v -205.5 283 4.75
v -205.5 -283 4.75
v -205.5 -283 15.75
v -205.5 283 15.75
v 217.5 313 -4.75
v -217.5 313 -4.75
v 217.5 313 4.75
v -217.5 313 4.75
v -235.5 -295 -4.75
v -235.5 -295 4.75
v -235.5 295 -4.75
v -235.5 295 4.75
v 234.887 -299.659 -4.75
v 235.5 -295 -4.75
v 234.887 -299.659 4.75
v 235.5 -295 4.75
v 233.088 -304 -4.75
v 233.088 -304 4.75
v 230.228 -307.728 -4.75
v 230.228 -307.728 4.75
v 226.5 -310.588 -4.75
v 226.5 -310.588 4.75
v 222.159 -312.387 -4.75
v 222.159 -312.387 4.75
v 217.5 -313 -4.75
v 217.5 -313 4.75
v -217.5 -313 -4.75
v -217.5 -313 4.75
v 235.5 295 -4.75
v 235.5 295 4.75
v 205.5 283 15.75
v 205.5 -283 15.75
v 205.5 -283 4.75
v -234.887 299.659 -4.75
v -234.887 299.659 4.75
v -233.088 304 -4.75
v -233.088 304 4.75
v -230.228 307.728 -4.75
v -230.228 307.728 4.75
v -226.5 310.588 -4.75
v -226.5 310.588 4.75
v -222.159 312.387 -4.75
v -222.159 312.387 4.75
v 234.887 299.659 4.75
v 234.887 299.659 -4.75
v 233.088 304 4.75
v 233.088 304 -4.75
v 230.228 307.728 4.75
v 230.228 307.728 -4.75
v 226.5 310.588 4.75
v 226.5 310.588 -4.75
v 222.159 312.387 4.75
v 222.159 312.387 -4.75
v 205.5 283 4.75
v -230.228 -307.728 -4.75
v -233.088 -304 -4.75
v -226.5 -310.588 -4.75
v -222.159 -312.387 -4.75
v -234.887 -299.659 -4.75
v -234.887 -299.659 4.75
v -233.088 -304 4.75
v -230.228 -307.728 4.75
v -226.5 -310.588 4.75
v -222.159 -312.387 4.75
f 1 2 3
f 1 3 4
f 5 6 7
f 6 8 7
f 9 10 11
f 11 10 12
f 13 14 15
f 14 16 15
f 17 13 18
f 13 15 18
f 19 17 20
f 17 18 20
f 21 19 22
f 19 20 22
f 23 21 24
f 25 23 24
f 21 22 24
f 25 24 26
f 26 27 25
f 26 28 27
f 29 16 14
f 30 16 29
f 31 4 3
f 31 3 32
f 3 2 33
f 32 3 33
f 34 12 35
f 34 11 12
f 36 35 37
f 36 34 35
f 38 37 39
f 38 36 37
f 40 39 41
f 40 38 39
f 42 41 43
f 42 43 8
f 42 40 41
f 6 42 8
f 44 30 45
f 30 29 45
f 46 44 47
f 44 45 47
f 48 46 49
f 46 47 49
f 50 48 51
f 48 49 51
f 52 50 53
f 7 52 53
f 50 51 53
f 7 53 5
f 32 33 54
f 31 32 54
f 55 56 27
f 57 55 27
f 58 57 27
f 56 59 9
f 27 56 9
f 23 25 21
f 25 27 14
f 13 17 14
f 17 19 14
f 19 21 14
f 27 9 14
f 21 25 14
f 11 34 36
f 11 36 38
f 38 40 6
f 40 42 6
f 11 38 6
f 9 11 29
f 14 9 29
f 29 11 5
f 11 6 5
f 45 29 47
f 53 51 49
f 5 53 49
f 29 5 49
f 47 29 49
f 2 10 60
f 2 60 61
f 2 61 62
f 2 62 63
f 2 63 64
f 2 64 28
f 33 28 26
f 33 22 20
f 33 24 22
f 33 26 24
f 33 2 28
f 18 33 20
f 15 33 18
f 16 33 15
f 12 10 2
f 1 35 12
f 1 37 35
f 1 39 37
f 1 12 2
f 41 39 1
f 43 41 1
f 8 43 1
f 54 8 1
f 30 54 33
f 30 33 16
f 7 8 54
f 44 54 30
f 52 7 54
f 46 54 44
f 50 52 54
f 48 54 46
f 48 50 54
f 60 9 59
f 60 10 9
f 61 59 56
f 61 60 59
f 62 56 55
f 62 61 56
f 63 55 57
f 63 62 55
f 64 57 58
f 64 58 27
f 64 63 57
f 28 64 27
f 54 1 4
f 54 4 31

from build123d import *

# Parameters (mm, degrees)
SKETCH_1_W      = 471
SKETCH_1_H      = 626
EXTRUDE_1_DEPTH = 4.75
FILLET_1_R      = 18
SKETCH_2_W      = 411
SKETCH_2_H      = 566
EXTRUDE_2_DEPTH = 11


with BuildPart() as part:
    # Эскиз1 → Бобышка-Вытянуть1 (new, symmetric)
    with BuildSketch(Plane.XY):
        Rectangle(SKETCH_1_W, SKETCH_1_H)
    extrude(amount=EXTRUDE_1_DEPTH, both=True)

    # Скругление1
    fillet_1_edges = [part.edges().sort_by_distance(p)[0] for p in [
        (235.5, -313, 0),
        (-235.5, -313, 0),
        (-235.5, 313, 0),
        (235.5, 313, 0),
    ]]
    fillet(fillet_1_edges, radius=FILLET_1_R)

    # Эскиз2 → Бобышка-Вытянуть2 (add)
    with BuildSketch(Plane.XY.offset(4.75)):
        Rectangle(SKETCH_2_W, SKETCH_2_H)
    extrude(amount=EXTRUDE_2_DEPTH)


solid = part.part
